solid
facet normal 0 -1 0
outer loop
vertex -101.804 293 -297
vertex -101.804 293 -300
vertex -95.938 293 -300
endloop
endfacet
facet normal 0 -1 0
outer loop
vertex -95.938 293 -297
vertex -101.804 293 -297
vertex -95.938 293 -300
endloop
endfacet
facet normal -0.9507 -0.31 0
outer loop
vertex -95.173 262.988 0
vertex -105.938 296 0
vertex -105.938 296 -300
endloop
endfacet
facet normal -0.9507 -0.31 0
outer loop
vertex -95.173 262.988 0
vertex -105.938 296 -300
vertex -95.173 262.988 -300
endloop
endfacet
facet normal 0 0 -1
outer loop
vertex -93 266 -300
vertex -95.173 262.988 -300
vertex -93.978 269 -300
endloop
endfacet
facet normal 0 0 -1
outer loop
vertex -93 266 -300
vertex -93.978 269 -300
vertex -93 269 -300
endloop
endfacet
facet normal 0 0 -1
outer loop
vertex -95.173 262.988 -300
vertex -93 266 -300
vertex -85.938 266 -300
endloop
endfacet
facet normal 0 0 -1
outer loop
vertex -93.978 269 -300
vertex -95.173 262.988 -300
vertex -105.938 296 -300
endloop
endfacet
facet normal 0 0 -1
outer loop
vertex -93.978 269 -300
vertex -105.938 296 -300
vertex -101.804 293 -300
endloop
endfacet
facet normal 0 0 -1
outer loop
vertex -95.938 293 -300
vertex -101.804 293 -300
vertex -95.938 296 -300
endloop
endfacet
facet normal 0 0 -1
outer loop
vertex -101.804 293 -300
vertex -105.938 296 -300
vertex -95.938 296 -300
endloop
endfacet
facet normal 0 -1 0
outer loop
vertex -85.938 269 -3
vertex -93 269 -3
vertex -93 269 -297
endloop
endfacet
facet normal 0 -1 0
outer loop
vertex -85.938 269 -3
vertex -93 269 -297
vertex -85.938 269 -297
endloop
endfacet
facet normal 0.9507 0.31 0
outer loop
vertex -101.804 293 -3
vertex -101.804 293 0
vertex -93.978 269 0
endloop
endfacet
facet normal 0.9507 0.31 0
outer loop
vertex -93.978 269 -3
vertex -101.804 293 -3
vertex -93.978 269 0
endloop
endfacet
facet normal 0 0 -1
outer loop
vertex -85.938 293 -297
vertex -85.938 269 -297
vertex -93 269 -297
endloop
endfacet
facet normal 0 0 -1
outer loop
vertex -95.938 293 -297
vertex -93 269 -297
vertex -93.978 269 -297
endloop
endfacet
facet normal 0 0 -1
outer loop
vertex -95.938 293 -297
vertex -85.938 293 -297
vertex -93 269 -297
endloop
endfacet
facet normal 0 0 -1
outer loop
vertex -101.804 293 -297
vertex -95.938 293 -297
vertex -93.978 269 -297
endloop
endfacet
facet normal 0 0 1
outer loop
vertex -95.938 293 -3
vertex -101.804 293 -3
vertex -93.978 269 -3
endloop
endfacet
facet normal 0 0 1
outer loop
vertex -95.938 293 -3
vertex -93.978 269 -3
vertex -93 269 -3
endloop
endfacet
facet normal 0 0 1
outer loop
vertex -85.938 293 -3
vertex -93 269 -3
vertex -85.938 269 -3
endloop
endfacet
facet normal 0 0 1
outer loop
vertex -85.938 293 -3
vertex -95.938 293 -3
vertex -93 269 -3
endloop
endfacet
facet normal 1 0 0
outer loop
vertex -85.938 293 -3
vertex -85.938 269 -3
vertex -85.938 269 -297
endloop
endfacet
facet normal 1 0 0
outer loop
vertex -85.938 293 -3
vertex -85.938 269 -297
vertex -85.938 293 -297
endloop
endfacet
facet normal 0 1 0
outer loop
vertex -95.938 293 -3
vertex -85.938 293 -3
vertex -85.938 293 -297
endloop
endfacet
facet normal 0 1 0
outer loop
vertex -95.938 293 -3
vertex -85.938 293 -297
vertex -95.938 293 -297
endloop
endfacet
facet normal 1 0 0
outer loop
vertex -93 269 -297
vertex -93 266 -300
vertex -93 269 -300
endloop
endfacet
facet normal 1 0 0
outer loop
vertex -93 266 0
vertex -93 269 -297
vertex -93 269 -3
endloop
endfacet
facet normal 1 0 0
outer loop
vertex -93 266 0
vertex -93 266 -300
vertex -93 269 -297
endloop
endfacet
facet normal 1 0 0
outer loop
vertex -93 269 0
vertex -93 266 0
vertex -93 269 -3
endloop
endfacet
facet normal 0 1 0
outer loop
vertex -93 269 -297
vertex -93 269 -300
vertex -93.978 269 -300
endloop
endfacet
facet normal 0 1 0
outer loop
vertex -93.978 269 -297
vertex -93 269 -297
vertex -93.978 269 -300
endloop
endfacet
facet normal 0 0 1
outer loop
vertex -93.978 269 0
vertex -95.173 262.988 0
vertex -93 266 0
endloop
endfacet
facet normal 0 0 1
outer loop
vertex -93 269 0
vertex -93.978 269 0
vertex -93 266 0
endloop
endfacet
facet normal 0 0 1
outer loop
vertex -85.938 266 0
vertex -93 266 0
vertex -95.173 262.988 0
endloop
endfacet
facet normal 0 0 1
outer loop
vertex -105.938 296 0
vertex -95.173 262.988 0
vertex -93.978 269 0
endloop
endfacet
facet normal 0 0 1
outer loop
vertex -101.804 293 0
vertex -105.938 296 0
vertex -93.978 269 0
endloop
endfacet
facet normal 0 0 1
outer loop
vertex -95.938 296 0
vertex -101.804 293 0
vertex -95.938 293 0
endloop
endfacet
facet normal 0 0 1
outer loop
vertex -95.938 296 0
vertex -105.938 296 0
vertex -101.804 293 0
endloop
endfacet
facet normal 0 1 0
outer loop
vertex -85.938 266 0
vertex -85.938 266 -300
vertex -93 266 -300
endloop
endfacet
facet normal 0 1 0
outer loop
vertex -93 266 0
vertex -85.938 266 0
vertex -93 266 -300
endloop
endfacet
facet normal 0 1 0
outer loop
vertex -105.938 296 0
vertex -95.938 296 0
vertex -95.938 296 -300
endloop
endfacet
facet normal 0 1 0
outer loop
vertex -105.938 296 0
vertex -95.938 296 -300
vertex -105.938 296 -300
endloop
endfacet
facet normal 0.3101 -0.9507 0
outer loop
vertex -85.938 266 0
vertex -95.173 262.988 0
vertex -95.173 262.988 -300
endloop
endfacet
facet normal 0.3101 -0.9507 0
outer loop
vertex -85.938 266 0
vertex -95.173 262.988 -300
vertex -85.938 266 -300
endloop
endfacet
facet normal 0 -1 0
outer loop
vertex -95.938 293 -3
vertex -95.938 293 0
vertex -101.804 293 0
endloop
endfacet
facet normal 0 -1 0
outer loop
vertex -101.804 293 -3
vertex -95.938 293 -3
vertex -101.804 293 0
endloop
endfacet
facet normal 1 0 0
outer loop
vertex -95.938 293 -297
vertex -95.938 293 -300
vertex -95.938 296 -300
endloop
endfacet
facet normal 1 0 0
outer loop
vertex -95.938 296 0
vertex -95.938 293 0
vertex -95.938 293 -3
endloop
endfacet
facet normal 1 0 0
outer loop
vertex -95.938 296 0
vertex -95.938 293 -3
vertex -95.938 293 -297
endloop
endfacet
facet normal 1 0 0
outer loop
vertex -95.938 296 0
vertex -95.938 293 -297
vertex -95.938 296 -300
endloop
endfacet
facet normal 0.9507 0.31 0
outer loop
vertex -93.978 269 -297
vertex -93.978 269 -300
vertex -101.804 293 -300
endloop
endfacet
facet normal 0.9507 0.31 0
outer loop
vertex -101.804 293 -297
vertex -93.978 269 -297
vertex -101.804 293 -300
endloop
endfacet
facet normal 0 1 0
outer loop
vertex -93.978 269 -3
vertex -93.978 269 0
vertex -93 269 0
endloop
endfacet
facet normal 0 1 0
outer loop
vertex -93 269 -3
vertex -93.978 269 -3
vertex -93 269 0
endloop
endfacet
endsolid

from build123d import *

# Parameters (mm, degrees)
BOSS_EXTRUDE1_DEPTH = 300
CUT_EXTRUDE1_DEPTH  = 3
CUT_EXTRUDE2_DEPTH  = 3


with BuildPart() as part:
    # Sketch1 → Boss-Extrude1 (new body)
    with BuildSketch(Plane.XY):
        Polygon((-105.938079236, 296), (-95.173448736, 262.988466467), (-85.938079236, 266), (-93, 266), (-93, 269), (-85.938079236, 269), (-85.938079236, 293), (-95.938079236, 293), (-95.938079236, 296), align=None)
    extrude(amount=-BOSS_EXTRUDE1_DEPTH)

    # Sketch2 → Cut-Extrude1 (cut)
    with BuildSketch(Plane(origin=(0, 0, -300), x_dir=(-1, 0, 0), z_dir=(0, 0, -1))):
        Polygon((93, 269), (93.97826087, 269), (101.804347826, 293), (95.938079236, 293), (85.938079236, 293), (85.938079236, 269), align=None)
    extrude(amount=-CUT_EXTRUDE1_DEPTH, mode=Mode.SUBTRACT)

    # Sketch3 → Cut-Extrude2 (cut)
    with BuildSketch(Plane.XY):
        Polygon((-101.804347826, 293), (-93.97826087, 269), (-93, 269), (-85.938079236, 269), (-85.938079236, 293), (-95.938079236, 293), align=None)
    extrude(amount=-CUT_EXTRUDE2_DEPTH, mode=Mode.SUBTRACT)


solid = part.part
